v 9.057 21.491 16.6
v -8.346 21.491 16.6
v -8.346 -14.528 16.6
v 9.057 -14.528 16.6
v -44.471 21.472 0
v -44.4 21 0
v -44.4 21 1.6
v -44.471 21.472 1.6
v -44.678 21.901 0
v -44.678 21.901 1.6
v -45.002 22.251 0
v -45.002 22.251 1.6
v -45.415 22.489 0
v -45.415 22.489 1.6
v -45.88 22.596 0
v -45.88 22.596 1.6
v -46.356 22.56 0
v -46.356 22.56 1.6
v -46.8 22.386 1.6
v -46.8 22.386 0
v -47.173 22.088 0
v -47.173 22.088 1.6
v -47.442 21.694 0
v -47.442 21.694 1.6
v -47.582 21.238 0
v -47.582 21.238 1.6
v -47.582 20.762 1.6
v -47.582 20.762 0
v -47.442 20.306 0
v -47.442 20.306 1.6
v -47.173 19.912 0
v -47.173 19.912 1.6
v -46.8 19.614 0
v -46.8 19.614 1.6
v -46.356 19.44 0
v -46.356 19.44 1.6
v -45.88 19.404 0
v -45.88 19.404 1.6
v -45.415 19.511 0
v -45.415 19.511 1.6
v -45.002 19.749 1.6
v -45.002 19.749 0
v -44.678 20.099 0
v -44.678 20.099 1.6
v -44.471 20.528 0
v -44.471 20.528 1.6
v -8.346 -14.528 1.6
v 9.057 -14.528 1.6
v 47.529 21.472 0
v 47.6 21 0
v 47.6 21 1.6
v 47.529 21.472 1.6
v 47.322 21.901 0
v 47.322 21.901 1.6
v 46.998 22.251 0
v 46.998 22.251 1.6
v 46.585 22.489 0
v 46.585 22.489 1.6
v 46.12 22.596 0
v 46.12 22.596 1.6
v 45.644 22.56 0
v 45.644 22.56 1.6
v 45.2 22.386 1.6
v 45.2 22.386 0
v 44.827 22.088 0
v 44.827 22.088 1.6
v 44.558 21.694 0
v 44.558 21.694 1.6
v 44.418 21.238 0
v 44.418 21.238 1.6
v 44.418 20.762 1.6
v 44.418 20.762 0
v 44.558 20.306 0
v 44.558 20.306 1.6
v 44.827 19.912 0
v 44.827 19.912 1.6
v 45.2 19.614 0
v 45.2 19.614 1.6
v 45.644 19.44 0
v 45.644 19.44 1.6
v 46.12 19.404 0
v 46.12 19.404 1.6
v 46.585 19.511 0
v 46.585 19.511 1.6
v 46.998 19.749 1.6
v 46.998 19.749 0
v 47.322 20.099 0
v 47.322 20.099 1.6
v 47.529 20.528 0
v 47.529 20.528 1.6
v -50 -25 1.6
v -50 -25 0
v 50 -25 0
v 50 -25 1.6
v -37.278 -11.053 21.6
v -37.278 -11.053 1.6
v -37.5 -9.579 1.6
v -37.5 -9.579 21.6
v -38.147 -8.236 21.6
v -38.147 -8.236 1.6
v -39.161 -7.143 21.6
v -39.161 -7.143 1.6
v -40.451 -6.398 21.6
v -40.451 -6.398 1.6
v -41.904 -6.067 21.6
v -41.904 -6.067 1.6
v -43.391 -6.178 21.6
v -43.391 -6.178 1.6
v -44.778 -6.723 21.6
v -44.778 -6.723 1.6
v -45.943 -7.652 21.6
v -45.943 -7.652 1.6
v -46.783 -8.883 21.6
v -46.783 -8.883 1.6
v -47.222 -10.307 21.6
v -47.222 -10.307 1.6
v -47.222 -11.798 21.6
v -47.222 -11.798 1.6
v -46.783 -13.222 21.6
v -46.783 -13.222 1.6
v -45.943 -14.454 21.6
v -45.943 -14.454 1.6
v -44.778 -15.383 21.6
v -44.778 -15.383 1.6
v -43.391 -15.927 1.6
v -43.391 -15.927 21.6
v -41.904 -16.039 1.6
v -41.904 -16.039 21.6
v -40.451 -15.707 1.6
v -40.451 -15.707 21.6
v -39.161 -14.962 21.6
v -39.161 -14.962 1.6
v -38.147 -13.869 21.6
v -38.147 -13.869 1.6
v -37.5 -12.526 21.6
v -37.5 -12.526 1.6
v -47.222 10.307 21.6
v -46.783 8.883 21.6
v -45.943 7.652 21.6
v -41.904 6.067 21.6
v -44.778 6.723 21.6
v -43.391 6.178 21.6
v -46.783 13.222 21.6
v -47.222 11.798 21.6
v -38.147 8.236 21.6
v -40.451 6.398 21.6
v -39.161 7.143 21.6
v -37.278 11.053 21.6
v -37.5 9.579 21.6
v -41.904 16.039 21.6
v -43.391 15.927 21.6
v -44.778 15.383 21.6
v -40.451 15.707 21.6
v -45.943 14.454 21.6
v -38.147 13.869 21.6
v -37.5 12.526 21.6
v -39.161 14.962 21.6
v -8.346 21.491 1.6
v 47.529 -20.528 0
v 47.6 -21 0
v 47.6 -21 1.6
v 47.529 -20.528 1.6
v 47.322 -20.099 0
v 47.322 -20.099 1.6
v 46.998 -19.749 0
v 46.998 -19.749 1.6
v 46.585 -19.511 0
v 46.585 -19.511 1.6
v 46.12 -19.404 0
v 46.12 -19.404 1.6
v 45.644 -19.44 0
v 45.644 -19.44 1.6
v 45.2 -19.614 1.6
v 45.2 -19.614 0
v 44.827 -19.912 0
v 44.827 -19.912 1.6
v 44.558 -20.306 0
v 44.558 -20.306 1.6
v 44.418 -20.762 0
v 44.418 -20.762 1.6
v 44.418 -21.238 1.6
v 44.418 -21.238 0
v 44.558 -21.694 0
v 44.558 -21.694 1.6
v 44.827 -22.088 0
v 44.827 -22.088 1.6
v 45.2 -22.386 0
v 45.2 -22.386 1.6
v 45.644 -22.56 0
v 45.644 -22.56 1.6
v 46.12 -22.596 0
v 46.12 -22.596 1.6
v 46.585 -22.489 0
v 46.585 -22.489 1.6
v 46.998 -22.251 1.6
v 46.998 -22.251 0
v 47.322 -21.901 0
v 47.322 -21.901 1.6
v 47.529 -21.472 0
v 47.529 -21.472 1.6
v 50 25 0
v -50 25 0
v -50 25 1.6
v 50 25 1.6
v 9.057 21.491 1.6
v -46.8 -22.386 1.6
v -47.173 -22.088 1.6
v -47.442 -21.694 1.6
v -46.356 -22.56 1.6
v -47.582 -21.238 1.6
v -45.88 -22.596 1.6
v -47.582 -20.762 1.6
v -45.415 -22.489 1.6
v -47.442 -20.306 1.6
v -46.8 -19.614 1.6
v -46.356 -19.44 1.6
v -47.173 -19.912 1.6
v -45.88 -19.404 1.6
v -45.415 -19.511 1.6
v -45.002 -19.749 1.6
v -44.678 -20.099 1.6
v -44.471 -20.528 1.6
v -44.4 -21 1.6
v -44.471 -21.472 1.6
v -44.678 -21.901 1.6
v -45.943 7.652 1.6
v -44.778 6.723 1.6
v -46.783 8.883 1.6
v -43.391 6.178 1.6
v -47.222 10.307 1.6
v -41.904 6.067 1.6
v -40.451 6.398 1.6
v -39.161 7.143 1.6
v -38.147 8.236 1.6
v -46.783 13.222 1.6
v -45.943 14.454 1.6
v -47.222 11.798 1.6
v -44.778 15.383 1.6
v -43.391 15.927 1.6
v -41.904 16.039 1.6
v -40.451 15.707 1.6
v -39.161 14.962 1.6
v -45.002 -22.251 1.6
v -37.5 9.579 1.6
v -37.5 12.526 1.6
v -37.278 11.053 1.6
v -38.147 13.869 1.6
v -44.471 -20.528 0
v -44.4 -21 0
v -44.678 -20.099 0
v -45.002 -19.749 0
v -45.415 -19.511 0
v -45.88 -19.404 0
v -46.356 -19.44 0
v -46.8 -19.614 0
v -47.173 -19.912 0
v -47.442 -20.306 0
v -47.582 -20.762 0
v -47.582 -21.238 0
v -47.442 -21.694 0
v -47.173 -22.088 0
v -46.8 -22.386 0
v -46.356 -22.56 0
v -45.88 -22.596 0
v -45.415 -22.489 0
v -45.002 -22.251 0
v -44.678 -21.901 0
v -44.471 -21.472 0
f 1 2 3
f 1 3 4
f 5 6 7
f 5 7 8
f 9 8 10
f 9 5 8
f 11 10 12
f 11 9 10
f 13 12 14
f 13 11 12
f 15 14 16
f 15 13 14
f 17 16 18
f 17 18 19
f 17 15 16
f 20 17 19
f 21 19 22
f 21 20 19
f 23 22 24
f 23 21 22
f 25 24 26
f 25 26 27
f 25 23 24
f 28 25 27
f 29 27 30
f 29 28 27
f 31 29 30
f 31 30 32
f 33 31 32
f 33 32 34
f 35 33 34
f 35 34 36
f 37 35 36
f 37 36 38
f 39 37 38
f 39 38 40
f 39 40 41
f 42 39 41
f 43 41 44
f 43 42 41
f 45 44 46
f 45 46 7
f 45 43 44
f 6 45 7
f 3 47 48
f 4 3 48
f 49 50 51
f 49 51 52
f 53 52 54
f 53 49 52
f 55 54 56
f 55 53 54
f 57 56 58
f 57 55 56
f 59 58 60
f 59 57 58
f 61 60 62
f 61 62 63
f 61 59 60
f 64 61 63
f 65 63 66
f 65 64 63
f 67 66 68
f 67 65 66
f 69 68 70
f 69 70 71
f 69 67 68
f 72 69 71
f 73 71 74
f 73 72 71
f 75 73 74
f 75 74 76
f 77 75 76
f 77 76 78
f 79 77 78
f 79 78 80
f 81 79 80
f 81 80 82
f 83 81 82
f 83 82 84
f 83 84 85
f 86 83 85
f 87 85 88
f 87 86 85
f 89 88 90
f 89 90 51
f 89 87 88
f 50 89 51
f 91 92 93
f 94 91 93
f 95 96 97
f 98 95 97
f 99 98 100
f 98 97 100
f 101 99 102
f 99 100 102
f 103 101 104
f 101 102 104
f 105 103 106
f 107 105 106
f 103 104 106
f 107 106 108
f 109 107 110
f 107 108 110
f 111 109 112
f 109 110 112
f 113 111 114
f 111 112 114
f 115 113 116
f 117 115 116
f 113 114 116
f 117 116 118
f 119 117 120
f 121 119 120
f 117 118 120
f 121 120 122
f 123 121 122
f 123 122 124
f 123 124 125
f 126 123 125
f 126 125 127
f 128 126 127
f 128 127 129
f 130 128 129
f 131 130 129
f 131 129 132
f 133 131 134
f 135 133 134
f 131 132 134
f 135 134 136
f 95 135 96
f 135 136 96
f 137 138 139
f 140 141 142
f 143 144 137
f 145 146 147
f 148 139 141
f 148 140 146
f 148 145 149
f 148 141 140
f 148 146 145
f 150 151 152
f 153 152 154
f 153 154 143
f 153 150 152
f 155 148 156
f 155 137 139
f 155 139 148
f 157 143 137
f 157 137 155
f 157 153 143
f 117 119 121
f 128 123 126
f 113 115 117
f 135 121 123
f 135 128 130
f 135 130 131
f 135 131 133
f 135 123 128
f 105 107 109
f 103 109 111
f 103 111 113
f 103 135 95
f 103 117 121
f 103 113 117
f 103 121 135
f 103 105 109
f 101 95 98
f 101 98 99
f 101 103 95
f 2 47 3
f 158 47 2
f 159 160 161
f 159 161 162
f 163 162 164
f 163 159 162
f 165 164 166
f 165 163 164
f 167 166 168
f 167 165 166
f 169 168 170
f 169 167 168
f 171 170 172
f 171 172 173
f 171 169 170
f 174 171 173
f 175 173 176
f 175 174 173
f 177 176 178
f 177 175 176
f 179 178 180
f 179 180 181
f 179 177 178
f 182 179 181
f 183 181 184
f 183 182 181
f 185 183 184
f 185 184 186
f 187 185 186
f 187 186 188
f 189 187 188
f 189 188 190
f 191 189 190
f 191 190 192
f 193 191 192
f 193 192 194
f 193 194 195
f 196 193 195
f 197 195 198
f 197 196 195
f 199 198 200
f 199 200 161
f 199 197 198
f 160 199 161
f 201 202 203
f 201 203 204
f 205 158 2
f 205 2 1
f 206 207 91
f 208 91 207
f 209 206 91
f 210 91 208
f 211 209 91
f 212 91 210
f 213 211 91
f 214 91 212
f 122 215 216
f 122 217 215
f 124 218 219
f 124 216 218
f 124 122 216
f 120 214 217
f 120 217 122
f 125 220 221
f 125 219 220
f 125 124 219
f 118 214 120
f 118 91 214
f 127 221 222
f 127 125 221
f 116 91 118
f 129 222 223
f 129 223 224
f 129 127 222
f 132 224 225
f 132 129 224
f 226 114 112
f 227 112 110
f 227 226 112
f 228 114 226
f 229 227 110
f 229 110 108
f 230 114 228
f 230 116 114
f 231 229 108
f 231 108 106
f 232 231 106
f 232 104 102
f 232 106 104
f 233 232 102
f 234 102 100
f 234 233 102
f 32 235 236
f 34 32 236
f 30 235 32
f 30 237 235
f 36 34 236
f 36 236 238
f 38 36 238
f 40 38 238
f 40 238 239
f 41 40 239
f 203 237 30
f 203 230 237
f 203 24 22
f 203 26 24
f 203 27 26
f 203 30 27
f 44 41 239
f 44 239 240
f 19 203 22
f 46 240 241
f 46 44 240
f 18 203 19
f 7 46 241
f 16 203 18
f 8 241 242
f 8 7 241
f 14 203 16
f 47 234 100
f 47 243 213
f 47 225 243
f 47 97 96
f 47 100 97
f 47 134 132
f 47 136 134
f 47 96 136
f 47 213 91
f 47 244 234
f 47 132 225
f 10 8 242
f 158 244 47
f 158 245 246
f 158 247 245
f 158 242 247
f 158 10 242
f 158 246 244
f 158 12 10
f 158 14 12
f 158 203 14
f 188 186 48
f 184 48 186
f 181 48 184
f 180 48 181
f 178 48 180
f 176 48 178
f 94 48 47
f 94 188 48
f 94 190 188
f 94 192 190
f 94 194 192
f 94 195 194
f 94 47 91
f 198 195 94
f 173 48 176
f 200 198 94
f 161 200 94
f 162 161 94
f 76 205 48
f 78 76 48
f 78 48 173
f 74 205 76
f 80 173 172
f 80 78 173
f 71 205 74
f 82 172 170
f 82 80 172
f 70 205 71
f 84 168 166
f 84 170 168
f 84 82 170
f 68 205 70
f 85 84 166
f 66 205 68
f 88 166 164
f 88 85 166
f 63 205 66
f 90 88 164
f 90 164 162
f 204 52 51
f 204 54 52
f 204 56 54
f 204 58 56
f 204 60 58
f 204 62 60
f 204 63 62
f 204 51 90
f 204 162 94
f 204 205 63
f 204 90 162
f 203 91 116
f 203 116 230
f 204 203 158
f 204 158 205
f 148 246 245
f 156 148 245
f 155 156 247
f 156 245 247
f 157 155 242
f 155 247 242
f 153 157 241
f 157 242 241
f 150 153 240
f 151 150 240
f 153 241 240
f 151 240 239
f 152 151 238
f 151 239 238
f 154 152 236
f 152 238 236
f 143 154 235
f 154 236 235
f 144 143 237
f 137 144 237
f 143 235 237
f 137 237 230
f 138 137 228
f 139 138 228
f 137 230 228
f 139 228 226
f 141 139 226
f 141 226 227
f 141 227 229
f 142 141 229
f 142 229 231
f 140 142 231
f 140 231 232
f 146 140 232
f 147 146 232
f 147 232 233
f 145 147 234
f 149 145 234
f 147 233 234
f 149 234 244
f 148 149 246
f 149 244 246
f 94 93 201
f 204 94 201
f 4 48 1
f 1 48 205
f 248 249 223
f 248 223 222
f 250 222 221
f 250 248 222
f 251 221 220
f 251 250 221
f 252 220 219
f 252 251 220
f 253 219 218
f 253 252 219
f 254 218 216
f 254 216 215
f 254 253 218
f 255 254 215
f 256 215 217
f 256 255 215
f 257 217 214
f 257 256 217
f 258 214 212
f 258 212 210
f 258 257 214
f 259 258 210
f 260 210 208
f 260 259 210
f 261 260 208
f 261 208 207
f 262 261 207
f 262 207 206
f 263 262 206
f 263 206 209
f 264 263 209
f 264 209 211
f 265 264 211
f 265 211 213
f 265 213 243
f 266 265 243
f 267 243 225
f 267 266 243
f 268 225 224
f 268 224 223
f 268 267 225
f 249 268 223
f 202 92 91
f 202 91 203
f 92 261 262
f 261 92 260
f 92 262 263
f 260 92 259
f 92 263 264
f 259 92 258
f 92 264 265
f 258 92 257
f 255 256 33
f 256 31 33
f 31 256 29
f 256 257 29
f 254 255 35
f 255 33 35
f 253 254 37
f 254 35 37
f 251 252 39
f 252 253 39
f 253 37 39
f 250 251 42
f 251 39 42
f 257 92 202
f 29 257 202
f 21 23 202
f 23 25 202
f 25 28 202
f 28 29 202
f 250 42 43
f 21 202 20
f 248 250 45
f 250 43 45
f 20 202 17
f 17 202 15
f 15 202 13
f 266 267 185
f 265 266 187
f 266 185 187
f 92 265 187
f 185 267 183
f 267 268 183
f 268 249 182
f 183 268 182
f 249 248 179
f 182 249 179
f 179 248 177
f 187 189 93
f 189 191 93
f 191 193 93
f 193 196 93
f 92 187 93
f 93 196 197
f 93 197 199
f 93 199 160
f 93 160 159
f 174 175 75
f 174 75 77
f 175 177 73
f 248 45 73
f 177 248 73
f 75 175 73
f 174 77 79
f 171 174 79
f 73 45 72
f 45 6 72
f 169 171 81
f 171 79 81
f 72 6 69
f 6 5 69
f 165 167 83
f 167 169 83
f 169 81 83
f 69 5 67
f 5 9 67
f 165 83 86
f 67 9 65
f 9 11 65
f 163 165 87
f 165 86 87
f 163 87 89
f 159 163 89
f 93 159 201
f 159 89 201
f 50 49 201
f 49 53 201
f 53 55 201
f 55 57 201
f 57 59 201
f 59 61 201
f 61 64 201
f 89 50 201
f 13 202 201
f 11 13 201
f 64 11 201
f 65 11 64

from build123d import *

# Parameters (mm, degrees)
ESQUISSE1_W        = 100
ESQUISSE1_H        = 50
ESQUISSE1_R        = 1.6
BOSS_EXTRU_1_DEPTH = 1.6
ESQUISSE2_R        = 5
BOSS_EXTRU_2_DEPTH = 20
ESQUISSE3_W        = 17.40280045
ESQUISSE3_H        = 36.018530138
BOSS_EXTRU_3_DEPTH = 15


with BuildPart() as part:
    # Esquisse1 → Boss.-Extru.1 (new body)
    with BuildSketch(Plane.XY):
        Rectangle(ESQUISSE1_W, ESQUISSE1_H)
        with Locations((-46, 21)):
            Circle(ESQUISSE1_R, mode=Mode.SUBTRACT)
        with Locations((46, 21)):
            Circle(ESQUISSE1_R, mode=Mode.SUBTRACT)
        with Locations((46, -21)):
            Circle(ESQUISSE1_R, mode=Mode.SUBTRACT)
        with Locations((-46, -21)):
            Circle(ESQUISSE1_R, mode=Mode.SUBTRACT)
    extrude(amount=BOSS_EXTRU_1_DEPTH)

    # Esquisse2 → Boss.-Extru.2 (add)
    with BuildSketch(Plane.XY.offset(1.6)):
        with Locations((-42.277991317, 11.052639899)):
            Circle(ESQUISSE2_R)
        with Locations((-42.277991317, -11.052639899)):
            Circle(ESQUISSE2_R)
    extrude(amount=BOSS_EXTRU_2_DEPTH)

    # Esquisse3 → Boss.-Extru.3 (add)
    with BuildSketch(Plane.XY.offset(1.6)):
        with Locations((0.355180215, 3.481690573)):
            Rectangle(ESQUISSE3_W, ESQUISSE3_H)
    extrude(amount=BOSS_EXTRU_3_DEPTH)


solid = part.part
